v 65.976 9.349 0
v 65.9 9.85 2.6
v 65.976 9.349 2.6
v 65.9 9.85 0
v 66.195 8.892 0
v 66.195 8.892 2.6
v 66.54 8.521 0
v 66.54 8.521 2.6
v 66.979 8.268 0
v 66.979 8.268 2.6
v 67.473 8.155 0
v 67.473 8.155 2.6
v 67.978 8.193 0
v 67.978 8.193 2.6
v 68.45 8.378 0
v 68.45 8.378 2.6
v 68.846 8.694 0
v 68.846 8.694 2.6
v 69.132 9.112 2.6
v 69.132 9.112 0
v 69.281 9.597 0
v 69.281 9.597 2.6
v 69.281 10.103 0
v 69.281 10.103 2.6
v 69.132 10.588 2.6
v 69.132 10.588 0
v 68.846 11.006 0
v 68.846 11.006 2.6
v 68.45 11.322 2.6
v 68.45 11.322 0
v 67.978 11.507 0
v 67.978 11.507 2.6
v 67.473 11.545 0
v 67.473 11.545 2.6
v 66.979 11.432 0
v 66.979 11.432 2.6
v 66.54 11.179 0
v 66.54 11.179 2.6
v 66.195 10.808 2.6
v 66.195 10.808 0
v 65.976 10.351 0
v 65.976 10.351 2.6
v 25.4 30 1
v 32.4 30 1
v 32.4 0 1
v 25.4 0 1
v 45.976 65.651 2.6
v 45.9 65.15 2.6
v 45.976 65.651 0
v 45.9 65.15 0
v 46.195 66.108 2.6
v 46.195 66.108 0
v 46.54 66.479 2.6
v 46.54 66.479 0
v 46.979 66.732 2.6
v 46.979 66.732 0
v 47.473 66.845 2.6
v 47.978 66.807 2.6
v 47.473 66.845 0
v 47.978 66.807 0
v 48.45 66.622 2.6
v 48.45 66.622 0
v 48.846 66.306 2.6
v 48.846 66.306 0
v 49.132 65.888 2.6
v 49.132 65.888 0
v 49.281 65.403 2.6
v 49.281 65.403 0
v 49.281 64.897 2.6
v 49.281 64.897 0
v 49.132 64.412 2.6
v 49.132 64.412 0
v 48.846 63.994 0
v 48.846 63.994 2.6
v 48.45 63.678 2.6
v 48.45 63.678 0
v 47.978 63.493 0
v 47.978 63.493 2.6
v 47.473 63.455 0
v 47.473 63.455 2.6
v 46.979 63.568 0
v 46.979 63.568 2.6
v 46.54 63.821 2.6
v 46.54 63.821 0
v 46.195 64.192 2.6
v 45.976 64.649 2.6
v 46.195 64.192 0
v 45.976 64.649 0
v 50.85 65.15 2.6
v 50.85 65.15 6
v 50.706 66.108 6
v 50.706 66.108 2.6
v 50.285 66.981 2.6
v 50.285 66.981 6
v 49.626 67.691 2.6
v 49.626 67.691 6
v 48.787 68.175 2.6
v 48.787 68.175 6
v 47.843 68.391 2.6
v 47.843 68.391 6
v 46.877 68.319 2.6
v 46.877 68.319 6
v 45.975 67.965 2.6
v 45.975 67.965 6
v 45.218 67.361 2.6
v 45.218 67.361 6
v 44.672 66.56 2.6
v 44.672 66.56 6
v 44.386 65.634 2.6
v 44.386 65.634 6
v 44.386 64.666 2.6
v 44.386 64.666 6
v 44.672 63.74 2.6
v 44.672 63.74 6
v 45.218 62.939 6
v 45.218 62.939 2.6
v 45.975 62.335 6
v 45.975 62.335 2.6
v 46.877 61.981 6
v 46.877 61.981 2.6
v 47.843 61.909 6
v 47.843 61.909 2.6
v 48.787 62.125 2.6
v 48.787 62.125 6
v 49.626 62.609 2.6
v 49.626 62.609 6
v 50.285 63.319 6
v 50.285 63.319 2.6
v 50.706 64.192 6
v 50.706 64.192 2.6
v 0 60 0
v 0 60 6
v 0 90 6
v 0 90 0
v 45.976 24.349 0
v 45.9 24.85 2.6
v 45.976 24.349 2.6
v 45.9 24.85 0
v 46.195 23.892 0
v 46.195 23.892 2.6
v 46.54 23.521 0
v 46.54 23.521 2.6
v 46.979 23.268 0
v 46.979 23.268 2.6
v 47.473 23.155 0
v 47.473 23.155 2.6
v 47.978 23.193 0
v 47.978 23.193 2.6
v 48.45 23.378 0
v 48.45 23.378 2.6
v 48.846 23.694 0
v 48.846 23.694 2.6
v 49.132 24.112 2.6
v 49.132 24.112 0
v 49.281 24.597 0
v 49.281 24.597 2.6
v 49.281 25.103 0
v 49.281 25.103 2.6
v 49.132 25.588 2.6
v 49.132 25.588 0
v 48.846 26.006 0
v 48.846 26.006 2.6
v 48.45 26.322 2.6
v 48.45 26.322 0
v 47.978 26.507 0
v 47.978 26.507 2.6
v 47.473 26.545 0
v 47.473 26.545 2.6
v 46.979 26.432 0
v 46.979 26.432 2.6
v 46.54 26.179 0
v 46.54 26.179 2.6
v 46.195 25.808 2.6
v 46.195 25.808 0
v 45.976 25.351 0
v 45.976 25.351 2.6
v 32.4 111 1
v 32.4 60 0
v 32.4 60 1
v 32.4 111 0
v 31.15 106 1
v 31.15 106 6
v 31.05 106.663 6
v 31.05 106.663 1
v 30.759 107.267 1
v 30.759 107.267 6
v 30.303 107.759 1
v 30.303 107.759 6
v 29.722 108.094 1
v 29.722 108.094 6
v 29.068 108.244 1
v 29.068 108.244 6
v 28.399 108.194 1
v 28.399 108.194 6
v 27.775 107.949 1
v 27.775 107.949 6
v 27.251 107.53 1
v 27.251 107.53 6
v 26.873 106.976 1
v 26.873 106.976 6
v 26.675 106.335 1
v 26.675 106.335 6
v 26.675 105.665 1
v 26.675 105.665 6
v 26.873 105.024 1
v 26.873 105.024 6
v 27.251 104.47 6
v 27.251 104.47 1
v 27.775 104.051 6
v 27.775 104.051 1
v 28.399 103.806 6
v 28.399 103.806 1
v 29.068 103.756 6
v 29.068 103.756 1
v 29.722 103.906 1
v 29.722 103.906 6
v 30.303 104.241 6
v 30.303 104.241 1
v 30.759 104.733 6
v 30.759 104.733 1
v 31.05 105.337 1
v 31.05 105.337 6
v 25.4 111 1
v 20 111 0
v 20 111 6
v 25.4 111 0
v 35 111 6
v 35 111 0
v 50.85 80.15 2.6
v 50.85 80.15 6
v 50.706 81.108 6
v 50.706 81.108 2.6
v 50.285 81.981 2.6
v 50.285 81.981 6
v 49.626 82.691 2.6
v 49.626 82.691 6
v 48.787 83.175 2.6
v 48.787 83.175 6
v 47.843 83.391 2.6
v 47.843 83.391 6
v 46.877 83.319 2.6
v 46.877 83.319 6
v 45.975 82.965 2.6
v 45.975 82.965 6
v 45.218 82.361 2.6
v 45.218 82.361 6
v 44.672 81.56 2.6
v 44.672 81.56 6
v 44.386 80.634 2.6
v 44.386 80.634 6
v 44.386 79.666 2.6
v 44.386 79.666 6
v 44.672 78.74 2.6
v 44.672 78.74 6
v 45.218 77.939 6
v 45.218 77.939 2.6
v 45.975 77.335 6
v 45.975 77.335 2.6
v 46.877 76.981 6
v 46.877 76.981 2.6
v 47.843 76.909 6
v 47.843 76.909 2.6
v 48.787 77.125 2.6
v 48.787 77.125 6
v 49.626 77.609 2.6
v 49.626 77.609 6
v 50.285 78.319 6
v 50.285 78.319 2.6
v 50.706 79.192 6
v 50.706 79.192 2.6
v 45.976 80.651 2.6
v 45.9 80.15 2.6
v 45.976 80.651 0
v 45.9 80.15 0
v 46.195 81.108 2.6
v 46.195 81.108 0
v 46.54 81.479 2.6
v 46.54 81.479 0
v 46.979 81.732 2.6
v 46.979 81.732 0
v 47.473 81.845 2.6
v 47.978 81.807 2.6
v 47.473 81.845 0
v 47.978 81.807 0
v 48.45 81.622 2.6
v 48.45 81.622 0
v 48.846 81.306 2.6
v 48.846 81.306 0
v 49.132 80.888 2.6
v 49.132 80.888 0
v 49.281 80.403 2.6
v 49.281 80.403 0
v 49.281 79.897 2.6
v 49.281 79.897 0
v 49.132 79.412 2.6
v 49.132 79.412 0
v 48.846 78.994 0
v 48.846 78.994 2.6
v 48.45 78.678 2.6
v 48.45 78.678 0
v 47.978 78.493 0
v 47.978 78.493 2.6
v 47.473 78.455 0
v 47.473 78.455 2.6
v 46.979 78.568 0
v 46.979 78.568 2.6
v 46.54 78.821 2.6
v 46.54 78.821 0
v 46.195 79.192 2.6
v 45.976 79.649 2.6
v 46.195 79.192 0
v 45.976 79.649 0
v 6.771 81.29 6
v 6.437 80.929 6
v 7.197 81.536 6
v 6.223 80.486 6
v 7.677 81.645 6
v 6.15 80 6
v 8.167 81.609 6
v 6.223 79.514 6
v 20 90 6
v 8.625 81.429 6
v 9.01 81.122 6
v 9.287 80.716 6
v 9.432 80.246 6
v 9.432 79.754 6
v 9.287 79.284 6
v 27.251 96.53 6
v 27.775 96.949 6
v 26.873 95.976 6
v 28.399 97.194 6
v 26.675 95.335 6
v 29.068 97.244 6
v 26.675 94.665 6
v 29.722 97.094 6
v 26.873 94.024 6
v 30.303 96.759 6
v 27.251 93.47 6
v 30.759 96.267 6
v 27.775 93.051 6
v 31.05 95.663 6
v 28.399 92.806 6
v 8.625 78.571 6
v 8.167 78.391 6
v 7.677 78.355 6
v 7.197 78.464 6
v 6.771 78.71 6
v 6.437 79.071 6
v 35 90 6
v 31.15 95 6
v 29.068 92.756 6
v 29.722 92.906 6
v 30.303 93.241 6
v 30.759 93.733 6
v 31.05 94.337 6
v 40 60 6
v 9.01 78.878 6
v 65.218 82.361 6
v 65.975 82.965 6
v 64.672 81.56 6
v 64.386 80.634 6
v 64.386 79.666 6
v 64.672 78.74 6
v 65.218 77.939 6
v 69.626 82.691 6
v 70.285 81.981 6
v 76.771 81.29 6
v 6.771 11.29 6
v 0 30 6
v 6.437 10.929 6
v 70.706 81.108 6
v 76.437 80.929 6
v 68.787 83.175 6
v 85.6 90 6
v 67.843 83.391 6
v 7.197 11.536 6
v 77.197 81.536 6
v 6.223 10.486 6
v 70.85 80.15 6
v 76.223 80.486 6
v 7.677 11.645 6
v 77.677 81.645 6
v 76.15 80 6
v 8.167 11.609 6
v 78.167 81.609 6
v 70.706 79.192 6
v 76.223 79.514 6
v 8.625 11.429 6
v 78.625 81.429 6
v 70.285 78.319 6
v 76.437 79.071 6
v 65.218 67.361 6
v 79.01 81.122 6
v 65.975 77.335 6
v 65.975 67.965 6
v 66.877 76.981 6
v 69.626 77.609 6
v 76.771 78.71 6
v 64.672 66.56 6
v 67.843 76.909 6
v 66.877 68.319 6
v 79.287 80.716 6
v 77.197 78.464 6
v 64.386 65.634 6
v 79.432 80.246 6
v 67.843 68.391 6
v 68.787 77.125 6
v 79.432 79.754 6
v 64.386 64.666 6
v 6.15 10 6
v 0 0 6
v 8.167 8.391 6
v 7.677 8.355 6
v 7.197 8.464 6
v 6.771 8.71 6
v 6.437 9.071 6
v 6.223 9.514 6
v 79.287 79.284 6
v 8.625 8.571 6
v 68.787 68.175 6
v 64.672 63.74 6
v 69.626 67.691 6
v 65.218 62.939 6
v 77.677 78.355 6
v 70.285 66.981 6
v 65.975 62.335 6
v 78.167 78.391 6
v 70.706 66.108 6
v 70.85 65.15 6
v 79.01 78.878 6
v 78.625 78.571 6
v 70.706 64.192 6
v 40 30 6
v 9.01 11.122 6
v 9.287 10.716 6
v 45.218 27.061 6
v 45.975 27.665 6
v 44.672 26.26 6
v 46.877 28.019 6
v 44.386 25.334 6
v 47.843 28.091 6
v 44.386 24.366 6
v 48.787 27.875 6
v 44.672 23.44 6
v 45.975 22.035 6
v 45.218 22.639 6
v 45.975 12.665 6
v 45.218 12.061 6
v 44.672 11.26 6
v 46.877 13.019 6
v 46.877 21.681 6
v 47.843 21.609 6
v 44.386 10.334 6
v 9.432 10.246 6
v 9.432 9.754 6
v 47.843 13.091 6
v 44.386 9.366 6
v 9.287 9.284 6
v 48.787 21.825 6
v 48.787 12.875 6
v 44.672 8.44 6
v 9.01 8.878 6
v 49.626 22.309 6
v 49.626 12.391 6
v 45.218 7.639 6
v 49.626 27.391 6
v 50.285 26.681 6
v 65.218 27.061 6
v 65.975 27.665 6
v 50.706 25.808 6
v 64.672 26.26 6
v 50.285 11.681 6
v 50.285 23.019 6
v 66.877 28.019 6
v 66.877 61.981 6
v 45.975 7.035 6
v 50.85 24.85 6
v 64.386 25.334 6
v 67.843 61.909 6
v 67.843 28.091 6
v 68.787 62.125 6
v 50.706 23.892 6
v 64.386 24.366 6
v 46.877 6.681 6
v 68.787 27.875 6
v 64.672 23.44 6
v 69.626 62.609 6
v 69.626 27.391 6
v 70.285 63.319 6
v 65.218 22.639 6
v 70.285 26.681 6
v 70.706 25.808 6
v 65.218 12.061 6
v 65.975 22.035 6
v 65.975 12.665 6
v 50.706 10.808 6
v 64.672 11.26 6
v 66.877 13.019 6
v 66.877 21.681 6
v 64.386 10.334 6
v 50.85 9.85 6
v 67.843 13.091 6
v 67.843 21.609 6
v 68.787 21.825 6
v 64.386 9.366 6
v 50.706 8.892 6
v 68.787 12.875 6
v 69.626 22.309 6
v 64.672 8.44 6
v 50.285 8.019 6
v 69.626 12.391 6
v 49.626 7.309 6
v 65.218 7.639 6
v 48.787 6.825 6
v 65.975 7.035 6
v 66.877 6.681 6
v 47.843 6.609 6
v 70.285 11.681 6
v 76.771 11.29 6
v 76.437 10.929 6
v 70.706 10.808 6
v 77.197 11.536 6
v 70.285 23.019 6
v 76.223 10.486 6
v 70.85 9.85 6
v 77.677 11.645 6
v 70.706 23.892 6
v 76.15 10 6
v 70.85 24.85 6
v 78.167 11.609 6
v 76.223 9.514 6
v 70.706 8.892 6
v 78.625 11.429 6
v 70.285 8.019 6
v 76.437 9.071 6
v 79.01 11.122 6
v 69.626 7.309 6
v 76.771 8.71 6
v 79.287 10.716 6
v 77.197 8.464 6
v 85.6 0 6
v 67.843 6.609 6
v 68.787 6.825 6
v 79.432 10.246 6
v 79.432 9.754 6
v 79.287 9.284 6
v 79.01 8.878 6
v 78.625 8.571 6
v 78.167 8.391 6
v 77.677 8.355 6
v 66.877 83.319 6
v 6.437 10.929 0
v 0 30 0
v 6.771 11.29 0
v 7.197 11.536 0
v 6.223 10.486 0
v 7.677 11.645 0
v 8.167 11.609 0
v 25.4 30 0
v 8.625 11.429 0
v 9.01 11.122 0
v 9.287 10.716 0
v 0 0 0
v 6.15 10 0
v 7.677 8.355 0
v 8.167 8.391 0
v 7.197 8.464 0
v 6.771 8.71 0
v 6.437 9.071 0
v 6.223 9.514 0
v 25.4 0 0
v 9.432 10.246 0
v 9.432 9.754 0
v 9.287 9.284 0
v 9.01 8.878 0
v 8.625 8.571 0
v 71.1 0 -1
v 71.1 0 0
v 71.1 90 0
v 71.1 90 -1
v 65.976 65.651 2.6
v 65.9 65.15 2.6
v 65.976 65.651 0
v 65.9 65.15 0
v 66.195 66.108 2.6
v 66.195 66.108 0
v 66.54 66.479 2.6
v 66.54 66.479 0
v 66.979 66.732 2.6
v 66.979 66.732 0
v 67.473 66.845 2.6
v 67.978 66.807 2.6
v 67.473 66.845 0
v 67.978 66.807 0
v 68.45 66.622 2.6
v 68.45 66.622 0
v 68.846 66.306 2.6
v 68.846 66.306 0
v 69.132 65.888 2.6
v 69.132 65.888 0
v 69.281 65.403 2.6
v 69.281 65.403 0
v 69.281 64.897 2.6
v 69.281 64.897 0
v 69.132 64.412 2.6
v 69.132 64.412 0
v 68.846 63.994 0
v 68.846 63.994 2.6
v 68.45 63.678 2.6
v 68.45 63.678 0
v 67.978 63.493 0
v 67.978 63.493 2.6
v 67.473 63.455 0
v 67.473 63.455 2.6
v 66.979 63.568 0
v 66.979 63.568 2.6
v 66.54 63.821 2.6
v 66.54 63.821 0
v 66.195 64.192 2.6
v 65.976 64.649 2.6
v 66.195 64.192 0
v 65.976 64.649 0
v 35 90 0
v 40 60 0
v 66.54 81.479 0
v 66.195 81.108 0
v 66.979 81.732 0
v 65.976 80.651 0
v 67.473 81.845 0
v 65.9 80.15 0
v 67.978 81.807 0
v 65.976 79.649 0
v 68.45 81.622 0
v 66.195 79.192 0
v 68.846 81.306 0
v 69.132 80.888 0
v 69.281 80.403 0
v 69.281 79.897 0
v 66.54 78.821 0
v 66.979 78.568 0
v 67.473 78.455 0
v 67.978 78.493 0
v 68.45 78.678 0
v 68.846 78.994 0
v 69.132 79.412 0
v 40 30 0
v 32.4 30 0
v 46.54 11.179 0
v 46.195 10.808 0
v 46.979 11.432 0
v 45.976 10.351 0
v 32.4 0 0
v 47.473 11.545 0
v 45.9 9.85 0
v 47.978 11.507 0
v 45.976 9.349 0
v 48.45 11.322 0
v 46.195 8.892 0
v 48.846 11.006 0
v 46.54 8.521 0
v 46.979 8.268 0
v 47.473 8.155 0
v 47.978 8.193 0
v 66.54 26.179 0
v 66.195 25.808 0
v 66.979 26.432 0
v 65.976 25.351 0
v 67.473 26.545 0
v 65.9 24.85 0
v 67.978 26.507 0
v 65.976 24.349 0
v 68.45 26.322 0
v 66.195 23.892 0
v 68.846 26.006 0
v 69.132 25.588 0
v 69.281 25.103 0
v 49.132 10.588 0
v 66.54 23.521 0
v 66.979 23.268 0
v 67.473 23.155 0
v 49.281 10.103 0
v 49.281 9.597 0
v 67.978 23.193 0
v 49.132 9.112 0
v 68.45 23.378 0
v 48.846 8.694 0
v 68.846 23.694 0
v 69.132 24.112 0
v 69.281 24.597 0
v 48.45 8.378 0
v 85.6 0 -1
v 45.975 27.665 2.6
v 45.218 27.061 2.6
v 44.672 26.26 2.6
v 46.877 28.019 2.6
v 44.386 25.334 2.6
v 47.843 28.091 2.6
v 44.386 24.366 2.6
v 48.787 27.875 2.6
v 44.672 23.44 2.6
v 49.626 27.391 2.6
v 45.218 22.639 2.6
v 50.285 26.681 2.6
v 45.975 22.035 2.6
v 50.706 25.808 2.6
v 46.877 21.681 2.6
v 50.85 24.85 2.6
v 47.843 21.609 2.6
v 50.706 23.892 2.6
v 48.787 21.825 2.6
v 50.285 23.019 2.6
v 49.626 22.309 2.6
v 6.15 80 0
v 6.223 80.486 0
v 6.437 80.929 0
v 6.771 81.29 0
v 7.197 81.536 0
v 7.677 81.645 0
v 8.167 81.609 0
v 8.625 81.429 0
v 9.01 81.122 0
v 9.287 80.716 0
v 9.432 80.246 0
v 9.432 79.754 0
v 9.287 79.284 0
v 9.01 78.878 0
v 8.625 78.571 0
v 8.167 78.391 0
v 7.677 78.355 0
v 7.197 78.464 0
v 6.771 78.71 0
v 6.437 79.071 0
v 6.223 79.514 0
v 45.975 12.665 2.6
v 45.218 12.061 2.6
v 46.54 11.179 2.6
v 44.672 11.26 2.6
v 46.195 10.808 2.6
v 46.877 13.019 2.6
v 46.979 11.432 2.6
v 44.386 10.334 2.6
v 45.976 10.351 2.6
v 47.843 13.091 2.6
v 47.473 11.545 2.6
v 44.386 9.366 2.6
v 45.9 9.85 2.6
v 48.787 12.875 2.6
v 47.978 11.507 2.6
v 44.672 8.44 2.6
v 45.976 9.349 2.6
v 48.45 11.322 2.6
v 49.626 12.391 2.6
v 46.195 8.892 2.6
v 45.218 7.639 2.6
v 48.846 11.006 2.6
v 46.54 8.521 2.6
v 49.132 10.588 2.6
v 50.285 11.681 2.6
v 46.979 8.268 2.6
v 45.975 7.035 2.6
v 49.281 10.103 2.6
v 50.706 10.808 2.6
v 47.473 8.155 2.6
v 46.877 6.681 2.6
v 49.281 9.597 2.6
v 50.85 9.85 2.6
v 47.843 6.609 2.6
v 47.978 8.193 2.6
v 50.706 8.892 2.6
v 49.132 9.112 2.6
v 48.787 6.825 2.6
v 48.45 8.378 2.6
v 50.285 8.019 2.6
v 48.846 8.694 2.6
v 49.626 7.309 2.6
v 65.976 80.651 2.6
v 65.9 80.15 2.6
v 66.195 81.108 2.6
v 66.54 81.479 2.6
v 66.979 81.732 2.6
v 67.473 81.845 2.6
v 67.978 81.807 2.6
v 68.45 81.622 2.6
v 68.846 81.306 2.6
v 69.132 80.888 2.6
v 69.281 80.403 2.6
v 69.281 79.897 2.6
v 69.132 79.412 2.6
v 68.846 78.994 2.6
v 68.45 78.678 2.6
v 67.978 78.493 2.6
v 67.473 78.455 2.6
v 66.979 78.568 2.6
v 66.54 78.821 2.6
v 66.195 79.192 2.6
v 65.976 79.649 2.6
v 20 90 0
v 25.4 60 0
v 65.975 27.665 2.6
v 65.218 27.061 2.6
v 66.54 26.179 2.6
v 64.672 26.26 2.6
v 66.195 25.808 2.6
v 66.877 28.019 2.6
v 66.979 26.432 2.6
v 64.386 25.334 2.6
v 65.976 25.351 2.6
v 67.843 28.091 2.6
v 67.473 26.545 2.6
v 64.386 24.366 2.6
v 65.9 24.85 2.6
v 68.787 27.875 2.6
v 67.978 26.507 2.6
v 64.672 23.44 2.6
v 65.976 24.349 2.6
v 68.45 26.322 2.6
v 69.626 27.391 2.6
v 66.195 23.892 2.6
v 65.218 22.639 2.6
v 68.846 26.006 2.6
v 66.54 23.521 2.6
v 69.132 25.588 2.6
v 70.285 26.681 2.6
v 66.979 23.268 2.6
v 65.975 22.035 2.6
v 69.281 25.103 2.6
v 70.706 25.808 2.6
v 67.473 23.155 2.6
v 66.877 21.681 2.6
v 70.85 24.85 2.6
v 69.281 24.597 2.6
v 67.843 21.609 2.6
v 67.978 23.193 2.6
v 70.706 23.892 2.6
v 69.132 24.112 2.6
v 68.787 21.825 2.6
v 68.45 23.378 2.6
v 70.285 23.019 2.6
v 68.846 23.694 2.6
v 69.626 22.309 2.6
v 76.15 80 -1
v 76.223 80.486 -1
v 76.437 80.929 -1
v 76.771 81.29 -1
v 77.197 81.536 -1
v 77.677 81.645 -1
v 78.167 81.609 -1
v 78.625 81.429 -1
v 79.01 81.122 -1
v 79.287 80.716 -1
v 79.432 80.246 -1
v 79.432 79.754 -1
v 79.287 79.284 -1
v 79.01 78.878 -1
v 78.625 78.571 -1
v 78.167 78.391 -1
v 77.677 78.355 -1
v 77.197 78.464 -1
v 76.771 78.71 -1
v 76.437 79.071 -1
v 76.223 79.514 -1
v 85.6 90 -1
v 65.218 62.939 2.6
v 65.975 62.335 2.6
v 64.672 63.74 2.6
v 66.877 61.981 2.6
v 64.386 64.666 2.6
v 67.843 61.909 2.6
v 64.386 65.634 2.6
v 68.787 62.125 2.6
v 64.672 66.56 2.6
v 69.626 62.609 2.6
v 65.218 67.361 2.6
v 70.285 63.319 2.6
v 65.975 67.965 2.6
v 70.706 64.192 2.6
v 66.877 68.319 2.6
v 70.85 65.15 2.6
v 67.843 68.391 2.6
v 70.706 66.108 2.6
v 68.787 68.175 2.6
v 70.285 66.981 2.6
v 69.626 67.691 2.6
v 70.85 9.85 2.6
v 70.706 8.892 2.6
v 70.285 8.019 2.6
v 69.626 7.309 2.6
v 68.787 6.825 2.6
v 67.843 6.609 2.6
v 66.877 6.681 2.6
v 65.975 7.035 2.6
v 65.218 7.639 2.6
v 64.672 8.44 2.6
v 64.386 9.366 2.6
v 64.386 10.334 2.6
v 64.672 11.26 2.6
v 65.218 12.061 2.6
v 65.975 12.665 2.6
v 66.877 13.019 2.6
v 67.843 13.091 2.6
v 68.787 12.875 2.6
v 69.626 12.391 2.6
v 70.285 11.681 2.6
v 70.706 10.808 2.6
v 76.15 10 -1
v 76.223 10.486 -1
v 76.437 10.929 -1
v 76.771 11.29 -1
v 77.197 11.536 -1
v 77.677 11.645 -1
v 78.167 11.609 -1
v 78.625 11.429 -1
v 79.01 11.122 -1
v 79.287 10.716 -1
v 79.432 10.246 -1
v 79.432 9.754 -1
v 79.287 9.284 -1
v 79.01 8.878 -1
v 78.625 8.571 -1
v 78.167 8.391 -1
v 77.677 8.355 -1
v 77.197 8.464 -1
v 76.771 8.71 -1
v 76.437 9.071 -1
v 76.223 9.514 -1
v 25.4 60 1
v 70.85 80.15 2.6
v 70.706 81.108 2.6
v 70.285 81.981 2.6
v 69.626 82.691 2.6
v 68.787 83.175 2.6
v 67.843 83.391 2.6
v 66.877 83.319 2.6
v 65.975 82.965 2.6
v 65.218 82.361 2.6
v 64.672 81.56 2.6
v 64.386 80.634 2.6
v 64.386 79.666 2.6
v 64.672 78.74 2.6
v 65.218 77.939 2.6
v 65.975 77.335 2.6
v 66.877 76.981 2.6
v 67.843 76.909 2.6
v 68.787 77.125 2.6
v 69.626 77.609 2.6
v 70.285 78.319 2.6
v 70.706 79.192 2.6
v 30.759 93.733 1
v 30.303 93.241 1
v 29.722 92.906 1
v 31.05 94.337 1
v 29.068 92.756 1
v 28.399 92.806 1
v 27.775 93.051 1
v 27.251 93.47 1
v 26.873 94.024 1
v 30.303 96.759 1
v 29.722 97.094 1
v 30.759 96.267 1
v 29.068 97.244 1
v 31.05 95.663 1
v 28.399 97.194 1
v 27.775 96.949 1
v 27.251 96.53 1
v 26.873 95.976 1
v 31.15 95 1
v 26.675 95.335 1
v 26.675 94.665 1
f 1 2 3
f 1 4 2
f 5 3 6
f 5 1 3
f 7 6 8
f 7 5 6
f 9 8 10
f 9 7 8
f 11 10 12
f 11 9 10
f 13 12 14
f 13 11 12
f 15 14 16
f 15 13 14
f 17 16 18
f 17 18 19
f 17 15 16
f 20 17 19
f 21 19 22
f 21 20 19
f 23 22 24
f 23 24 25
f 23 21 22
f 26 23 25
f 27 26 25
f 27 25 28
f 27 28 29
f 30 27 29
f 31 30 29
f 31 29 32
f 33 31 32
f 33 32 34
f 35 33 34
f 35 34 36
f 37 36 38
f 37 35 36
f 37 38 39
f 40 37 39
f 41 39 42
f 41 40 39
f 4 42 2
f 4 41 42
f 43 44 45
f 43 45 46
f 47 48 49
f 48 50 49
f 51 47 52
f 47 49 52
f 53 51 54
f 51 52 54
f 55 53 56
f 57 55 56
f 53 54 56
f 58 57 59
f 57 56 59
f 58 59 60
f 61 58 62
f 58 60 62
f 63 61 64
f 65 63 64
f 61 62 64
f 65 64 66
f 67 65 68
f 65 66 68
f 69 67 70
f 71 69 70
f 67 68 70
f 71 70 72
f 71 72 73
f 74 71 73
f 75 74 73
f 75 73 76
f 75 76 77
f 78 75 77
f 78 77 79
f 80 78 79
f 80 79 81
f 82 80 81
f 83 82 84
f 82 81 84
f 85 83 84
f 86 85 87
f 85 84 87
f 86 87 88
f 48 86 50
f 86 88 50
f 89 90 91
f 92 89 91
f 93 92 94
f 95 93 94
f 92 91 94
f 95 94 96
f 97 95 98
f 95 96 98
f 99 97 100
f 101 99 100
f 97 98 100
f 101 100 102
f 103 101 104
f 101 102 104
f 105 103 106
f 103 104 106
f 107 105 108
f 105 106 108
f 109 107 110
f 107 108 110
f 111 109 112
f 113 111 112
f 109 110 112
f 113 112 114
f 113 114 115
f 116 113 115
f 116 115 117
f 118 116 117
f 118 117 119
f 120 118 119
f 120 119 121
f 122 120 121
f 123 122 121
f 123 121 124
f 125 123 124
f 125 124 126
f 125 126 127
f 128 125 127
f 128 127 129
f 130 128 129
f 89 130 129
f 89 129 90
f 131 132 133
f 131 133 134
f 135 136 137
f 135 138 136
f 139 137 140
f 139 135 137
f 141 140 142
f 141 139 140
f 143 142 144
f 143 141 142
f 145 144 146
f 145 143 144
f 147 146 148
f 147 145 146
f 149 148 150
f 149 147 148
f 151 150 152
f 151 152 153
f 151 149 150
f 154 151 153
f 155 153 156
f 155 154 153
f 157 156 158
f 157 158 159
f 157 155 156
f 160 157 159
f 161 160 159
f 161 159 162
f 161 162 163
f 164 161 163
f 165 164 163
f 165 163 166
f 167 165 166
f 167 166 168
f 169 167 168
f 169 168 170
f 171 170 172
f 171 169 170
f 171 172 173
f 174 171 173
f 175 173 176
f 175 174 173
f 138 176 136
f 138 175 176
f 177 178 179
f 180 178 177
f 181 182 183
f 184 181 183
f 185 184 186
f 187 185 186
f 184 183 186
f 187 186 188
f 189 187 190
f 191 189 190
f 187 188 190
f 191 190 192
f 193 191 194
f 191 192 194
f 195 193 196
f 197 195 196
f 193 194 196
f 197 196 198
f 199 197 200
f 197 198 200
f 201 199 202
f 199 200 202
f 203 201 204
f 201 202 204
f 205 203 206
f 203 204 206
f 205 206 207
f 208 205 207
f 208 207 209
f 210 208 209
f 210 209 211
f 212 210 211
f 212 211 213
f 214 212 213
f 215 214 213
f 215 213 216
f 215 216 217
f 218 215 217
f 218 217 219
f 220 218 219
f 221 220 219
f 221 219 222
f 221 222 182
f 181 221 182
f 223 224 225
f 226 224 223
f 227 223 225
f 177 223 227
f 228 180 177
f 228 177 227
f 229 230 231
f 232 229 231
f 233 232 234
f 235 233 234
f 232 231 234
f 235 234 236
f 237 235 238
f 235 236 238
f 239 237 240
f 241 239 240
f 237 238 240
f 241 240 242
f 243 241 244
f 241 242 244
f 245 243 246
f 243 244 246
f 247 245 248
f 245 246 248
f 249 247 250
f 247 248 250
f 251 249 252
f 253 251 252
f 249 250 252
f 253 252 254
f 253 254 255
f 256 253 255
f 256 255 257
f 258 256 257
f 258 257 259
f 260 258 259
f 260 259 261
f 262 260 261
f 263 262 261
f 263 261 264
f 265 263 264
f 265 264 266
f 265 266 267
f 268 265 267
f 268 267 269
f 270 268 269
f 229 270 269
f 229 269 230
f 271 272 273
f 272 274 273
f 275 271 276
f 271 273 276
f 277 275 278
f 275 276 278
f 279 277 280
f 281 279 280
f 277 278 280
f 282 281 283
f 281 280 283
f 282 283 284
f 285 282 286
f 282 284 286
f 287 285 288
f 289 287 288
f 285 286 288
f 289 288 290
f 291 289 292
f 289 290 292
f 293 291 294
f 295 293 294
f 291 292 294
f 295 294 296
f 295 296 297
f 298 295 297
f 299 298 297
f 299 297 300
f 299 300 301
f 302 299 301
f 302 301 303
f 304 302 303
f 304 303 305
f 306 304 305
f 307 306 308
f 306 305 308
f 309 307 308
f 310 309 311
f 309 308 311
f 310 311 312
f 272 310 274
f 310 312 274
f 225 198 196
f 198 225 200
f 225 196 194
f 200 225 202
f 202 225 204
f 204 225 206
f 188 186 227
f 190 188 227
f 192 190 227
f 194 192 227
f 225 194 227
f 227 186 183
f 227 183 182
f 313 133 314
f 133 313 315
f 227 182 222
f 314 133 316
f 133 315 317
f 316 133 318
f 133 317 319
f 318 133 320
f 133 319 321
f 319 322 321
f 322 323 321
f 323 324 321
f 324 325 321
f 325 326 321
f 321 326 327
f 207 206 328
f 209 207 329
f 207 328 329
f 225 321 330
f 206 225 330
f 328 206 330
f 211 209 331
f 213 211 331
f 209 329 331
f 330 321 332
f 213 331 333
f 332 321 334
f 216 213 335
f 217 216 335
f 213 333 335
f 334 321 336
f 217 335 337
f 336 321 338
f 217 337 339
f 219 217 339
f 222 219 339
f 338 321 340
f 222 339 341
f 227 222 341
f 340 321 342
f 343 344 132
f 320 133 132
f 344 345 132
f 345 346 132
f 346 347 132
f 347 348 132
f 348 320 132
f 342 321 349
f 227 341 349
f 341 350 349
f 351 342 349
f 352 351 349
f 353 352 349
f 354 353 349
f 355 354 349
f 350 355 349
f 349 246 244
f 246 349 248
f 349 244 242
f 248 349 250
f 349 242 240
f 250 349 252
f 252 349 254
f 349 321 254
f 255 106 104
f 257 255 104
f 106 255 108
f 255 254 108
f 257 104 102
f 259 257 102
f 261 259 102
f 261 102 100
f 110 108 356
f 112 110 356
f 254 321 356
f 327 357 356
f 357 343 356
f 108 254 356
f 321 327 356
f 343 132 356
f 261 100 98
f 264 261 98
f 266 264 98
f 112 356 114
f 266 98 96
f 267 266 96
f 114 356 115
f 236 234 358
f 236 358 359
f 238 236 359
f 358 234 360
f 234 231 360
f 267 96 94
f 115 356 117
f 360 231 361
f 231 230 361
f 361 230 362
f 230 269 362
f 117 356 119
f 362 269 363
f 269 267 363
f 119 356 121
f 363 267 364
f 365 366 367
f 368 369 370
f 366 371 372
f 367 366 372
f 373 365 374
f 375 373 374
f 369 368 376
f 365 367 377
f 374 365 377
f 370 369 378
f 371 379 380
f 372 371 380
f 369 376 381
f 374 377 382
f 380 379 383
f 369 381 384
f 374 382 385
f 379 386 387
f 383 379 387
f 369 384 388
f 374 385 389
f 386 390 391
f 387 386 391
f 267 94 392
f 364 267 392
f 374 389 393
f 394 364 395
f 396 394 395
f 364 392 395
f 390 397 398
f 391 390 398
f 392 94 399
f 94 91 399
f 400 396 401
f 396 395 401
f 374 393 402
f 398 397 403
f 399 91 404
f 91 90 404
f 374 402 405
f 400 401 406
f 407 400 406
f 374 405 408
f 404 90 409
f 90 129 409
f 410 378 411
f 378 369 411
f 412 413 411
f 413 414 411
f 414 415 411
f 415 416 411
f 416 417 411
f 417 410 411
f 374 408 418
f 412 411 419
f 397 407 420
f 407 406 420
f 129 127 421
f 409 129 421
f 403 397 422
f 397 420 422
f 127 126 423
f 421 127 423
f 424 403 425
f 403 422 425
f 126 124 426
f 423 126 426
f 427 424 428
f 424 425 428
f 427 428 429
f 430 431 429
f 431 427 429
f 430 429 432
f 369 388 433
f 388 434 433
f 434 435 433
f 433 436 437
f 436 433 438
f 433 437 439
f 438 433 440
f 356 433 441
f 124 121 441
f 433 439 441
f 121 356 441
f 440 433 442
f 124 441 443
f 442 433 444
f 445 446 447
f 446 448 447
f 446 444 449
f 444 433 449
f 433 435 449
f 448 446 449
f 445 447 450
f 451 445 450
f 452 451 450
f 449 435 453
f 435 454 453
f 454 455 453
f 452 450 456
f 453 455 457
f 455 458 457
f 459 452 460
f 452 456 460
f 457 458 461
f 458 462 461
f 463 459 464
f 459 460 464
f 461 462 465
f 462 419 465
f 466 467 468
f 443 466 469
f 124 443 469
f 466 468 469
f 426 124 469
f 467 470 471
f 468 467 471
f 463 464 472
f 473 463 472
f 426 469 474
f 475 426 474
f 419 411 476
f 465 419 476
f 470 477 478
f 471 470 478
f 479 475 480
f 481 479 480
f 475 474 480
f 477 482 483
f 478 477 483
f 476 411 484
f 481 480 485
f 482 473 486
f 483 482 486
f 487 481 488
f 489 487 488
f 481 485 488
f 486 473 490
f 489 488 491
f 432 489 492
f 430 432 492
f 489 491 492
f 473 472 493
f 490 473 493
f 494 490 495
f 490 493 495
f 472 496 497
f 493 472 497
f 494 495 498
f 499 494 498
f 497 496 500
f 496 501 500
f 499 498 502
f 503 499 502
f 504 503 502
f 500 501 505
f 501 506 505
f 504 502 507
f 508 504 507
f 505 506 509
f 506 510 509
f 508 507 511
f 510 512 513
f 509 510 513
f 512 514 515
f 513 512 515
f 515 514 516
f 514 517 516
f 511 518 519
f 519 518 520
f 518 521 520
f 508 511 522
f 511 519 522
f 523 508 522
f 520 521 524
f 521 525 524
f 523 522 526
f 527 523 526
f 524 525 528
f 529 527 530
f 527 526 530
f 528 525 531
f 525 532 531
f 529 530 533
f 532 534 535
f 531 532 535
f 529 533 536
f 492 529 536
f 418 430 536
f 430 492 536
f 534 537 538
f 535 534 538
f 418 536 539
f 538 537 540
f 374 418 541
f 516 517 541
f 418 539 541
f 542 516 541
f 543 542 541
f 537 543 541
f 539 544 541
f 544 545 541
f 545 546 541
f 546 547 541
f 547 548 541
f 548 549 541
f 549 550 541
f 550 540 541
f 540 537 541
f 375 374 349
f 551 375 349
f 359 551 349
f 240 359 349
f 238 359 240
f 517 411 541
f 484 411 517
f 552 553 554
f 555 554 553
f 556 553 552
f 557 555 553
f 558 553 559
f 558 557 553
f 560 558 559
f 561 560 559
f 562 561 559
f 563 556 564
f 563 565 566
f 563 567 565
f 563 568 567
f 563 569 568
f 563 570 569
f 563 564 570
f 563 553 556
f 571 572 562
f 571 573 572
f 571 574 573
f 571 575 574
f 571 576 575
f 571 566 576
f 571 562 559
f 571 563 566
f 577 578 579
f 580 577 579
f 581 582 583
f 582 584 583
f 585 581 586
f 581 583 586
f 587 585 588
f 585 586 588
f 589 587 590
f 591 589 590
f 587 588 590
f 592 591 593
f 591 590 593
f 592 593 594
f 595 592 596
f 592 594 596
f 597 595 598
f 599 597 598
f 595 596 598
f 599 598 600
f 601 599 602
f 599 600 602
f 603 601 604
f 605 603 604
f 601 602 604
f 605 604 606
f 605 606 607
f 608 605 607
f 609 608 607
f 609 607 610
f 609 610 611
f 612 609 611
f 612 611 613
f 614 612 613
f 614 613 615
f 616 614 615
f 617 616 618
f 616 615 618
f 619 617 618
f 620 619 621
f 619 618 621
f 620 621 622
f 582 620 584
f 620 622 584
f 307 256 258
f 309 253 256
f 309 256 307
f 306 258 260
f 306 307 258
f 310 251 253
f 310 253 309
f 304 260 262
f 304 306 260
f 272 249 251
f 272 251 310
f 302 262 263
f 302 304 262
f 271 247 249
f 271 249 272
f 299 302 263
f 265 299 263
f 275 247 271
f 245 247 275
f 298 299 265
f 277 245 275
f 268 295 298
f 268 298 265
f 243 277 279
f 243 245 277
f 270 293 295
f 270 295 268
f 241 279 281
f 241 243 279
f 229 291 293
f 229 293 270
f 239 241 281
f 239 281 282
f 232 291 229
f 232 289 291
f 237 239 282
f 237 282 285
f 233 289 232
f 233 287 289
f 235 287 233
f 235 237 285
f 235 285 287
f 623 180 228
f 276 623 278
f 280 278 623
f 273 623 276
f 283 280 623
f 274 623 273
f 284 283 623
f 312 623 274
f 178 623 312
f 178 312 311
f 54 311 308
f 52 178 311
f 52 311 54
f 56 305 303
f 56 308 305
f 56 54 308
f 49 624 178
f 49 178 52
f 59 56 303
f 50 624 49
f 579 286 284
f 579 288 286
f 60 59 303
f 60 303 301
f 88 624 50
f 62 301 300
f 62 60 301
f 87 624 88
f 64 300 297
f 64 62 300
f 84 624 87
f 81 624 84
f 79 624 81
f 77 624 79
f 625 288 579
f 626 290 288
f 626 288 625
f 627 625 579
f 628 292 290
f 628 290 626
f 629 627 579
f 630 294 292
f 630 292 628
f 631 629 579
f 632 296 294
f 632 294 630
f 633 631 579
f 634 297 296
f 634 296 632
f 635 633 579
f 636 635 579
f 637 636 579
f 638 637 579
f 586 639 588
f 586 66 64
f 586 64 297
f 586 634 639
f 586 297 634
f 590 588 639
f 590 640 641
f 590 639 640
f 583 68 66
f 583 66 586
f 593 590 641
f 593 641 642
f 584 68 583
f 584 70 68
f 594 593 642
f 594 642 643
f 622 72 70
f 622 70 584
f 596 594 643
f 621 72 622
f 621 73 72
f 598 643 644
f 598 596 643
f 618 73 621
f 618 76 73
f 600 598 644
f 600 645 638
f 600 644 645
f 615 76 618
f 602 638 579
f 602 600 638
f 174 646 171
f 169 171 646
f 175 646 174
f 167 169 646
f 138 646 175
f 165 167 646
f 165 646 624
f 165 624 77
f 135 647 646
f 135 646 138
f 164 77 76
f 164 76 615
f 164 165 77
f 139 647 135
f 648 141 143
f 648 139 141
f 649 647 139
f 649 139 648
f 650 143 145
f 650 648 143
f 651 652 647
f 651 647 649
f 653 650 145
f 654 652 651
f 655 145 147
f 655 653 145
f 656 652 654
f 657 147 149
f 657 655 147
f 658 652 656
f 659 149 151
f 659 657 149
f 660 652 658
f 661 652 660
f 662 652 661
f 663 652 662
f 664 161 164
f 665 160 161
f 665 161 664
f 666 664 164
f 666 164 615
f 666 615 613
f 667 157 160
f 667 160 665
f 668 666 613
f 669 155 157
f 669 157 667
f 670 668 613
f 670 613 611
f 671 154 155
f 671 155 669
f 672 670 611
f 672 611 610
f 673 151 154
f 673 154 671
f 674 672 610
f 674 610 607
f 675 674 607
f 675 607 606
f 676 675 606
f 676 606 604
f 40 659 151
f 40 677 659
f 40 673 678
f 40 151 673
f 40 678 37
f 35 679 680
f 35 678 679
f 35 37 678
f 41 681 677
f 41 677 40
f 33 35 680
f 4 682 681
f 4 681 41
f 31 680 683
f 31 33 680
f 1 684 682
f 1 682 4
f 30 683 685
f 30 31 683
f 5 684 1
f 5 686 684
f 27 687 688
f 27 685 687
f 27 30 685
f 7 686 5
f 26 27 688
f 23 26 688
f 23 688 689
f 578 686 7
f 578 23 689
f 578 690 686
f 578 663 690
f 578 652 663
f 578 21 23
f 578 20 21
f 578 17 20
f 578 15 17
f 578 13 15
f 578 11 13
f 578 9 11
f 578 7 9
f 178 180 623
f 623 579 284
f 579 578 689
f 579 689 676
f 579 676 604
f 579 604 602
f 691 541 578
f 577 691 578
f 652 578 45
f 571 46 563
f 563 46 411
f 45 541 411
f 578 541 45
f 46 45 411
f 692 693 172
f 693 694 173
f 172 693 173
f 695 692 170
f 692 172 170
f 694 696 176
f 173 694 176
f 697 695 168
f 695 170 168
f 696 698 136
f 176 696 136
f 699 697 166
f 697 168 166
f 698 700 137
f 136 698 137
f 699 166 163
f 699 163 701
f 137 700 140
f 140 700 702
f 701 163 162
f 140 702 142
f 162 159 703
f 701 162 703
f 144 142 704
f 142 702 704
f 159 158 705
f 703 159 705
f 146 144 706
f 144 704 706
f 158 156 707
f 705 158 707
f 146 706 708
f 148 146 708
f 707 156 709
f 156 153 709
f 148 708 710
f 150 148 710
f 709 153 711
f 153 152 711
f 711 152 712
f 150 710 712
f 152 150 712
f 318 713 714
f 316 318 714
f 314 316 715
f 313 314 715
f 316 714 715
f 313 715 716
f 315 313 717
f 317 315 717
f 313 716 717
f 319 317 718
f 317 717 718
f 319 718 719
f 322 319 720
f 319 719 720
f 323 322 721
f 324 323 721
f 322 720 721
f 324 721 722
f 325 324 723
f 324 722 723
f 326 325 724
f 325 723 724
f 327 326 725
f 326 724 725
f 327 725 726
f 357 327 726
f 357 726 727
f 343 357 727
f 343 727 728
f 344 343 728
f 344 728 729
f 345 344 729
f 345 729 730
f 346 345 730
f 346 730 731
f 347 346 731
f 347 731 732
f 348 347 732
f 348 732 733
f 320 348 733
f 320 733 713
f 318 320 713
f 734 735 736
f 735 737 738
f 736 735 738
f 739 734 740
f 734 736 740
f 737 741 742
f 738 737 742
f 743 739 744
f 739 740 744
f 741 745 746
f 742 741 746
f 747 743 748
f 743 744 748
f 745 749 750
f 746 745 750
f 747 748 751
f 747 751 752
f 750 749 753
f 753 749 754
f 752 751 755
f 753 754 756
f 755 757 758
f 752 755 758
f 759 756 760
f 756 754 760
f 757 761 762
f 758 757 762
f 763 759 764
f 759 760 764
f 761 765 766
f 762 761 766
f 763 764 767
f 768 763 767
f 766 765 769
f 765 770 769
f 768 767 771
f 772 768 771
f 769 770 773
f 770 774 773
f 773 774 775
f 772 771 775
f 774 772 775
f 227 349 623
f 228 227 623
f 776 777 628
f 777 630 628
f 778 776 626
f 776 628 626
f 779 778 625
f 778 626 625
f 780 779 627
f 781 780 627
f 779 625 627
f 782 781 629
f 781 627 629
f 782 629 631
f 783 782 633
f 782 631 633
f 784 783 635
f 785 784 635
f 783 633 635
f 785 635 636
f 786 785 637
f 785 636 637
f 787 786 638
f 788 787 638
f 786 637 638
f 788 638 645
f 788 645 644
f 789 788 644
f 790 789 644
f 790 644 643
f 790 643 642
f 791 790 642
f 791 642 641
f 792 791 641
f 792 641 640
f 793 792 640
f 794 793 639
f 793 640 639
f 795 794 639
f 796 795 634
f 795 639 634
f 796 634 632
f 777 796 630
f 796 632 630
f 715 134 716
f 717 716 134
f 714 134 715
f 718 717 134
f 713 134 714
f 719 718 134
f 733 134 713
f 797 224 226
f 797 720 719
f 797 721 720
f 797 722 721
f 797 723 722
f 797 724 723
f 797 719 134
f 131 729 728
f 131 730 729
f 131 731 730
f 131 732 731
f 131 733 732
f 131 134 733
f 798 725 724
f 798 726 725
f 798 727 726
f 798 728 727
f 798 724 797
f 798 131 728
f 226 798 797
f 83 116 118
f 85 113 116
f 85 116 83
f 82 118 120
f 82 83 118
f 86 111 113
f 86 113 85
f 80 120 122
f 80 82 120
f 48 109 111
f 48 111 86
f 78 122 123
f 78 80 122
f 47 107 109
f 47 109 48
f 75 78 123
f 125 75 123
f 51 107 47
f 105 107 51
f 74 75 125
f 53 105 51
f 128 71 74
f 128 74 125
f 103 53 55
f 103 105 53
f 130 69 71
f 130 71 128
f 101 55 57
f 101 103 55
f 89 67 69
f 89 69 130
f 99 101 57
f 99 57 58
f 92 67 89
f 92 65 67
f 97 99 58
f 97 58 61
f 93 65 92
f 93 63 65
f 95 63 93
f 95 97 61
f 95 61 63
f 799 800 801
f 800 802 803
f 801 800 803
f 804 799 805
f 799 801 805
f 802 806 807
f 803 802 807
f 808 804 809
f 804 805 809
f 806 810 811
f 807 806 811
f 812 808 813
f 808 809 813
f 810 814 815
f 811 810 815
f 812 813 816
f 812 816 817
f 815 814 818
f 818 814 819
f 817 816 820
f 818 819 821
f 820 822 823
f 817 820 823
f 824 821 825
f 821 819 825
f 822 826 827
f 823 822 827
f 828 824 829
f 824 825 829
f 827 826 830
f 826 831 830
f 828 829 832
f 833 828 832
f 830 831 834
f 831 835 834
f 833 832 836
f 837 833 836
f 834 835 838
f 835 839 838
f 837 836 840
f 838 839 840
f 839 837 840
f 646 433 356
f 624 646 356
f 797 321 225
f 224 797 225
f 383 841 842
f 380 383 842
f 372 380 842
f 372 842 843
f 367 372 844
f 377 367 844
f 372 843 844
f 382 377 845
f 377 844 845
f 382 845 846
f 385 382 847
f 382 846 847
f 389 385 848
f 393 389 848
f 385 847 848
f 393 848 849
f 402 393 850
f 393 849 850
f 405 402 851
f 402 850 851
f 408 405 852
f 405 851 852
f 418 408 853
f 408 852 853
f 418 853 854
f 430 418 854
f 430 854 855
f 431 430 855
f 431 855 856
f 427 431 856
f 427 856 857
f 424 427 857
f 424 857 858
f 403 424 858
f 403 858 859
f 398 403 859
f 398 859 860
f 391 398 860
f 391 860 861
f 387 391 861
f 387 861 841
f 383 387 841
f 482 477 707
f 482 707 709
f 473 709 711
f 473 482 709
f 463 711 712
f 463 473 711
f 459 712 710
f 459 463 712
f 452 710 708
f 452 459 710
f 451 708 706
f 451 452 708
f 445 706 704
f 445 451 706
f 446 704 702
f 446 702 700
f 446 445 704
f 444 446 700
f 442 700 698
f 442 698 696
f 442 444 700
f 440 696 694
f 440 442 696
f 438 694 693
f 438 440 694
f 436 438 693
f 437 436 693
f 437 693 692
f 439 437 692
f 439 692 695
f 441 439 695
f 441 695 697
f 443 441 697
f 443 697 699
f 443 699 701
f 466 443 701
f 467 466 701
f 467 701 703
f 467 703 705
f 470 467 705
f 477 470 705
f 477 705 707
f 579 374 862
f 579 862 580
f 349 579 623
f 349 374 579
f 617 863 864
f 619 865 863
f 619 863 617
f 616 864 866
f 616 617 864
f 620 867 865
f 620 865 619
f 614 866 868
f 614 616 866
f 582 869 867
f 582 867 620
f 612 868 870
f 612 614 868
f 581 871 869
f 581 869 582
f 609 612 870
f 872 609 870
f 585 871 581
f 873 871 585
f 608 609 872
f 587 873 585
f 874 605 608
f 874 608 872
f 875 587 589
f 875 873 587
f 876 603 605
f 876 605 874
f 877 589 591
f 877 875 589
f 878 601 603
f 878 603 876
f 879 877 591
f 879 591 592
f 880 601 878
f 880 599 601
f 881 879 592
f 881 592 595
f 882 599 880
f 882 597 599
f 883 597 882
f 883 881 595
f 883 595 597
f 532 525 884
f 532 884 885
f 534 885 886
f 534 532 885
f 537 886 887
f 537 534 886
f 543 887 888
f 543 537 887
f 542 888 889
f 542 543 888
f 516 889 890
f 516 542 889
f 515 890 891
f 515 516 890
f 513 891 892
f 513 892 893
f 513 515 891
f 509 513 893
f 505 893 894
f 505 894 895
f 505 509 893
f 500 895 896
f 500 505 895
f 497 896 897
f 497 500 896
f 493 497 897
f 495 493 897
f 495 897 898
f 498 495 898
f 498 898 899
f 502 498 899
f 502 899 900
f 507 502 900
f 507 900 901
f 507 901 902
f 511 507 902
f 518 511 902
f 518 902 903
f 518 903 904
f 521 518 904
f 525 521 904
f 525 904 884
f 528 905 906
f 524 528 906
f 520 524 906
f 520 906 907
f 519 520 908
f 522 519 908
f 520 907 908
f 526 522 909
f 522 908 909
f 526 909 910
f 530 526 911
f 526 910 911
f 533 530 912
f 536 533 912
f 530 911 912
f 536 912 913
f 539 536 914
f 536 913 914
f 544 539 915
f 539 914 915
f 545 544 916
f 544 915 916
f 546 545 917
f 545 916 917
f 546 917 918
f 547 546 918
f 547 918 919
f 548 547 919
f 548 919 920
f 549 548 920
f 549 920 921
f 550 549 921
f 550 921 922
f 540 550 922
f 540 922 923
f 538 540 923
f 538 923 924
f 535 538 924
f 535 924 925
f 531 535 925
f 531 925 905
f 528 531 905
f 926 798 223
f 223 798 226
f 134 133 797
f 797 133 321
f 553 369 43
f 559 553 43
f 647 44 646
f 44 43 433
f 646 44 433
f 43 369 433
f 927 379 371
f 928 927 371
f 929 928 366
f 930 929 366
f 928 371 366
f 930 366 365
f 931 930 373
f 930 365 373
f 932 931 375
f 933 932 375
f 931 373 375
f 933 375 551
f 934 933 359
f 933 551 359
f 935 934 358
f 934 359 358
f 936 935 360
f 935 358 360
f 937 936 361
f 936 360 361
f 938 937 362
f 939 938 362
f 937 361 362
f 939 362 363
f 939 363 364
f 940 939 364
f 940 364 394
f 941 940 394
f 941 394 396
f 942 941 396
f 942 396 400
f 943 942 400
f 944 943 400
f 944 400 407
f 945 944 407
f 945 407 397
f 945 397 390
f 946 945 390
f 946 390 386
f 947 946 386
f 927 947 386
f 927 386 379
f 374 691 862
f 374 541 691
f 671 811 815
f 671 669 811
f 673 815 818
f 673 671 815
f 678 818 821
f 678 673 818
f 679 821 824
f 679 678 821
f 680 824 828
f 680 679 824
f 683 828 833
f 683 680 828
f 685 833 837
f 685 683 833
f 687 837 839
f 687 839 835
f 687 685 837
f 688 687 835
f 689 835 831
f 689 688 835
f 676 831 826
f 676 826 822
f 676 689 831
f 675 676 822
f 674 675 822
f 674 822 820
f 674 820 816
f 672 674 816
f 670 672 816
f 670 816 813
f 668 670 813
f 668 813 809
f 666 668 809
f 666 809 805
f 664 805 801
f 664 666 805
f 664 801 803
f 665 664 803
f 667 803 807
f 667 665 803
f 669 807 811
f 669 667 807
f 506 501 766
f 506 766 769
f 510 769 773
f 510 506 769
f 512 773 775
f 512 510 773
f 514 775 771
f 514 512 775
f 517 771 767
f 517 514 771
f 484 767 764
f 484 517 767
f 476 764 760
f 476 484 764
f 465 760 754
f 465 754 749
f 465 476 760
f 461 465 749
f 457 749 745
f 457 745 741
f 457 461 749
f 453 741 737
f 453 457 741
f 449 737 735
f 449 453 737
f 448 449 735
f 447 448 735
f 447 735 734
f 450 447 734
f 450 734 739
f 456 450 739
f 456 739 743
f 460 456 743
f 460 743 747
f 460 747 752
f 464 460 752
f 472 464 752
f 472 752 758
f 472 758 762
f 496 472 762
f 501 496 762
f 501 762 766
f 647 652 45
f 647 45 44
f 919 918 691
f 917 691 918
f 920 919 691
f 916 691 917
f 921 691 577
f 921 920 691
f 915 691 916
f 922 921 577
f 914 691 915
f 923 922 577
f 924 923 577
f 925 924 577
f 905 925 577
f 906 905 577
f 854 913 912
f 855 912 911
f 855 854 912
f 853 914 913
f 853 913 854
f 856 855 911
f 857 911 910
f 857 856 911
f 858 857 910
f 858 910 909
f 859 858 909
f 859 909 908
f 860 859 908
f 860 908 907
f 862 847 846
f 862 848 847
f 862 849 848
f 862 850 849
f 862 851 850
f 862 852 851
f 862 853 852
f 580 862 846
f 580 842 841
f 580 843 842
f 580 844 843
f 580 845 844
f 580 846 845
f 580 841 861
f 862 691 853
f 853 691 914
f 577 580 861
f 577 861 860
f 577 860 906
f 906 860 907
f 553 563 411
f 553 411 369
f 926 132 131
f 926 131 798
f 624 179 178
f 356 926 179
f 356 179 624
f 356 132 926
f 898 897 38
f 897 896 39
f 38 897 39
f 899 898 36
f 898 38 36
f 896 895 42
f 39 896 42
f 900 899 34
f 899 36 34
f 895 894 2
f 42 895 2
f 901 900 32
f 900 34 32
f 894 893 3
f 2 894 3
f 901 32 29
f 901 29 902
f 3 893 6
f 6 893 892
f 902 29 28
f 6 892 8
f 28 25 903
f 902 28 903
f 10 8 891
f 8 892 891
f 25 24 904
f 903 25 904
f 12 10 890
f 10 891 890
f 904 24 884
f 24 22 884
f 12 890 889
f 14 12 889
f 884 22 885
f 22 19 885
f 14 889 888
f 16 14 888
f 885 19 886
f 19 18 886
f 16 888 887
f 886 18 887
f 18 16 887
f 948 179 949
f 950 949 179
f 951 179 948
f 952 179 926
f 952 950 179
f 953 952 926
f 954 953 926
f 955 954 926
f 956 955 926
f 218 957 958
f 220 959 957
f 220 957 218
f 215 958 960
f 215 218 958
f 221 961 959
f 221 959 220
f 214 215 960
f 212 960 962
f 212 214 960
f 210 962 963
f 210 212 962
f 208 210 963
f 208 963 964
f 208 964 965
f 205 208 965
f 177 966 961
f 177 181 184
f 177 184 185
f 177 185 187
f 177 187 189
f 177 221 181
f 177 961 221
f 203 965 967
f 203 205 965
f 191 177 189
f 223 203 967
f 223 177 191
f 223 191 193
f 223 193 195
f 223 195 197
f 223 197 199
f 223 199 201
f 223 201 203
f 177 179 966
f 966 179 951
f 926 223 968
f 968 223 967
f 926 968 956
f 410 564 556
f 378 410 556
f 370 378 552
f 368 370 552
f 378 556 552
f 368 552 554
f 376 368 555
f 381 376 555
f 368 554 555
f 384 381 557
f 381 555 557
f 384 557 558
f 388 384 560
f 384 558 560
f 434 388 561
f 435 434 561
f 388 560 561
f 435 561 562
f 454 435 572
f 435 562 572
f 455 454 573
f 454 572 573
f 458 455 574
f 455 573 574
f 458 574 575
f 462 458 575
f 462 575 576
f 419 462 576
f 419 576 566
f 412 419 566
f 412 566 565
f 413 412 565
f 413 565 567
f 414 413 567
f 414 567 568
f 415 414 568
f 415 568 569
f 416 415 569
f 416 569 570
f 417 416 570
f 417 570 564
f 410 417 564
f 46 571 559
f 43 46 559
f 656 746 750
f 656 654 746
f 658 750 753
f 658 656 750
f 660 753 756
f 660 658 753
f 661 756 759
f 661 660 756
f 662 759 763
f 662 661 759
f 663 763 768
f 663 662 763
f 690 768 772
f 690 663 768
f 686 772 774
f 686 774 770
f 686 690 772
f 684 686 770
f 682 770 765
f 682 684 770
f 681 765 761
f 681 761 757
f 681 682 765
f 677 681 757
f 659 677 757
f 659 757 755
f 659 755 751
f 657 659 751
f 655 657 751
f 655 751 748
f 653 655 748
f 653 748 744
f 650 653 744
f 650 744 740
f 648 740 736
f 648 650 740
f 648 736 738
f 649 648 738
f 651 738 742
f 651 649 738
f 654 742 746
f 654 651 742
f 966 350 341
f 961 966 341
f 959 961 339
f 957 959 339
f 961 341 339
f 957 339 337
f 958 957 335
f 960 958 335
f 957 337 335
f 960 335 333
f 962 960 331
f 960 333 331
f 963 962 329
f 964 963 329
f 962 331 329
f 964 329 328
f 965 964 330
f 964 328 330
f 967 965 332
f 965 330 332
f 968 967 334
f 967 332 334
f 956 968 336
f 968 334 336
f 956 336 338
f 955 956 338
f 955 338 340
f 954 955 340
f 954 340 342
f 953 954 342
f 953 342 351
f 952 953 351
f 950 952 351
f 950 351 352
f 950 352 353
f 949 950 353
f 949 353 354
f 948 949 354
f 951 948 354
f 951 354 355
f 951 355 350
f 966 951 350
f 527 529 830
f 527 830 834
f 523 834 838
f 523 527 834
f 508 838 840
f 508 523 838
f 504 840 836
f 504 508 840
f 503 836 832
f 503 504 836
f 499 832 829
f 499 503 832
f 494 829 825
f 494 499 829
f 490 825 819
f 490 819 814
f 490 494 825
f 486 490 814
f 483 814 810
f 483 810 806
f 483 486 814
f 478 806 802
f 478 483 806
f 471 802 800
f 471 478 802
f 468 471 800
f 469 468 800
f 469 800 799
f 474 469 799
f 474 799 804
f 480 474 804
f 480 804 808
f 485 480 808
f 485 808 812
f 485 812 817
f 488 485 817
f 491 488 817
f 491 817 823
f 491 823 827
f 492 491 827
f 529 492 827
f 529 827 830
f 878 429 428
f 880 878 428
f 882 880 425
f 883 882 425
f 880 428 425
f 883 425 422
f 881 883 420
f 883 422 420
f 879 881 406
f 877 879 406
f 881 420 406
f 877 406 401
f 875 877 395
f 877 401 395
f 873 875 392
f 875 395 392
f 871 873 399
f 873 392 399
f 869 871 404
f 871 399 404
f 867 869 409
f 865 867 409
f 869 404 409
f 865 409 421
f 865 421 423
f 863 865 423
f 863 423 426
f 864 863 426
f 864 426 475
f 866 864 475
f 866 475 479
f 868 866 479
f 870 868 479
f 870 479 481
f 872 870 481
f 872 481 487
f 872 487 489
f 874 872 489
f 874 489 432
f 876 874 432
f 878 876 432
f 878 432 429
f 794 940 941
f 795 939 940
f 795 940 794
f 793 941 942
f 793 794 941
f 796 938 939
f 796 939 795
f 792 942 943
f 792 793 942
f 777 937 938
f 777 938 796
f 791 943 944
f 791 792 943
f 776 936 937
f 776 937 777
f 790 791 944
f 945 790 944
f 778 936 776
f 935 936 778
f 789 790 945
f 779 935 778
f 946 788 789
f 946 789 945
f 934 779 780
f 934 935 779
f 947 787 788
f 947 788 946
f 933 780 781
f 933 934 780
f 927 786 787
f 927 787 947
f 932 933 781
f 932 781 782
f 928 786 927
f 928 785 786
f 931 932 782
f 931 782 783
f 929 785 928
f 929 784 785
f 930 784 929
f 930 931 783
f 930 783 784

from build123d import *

# Parameters (mm, degrees)
SKETCH_1_W                   = 85.6
SKETCH_1_H                   = 90
EXTRUDE_1_DEPTH              = 6
SKETCH_2_W                   = 40
SKETCH_2_H                   = 30
CUT_EXTRUDE_1_DEPTH          = 7
SKETCH_3_W                   = 14.5
SKETCH_3_H                   = 90
EXTRUDE_2_DEPTH              = 1
HOLE_WIZARD_M3_1_D           = 3.4
HOLE_WIZARD_M3_1_CBORE_D     = 6.5
HOLE_WIZARD_M3_1_CBORE_DEPTH = 3.4
HOLE_WIZARD_M4_1_D           = 3.3
SKETCH_11_W                  = 35
SKETCH_11_H                  = 6
EXTRUDE_3_DEPTH              = 21
SKETCH_12_W                  = 20
SKETCH_12_H                  = 21
CUT_EXTRUDE_3_DEPTH          = 21
SKETCH_14_W                  = 7
SKETCH_14_H                  = 116.324427337
CUT_EXTRUDE_4_DEPTH          = 1
SKETCH_17_R                  = 2.25
CUT_EXTRUDE_5_DEPTH          = 8


with BuildPart() as part:
    # 草图1 → 凸台-拉伸1 (new body)
    with BuildSketch(Plane.XY):
        with Locations((42.8, 45)):
            Rectangle(SKETCH_1_W, SKETCH_1_H)
    extrude(amount=EXTRUDE_1_DEPTH)

    # 草图2 → 切除-拉伸1 (cut, through all)
    with BuildSketch(Plane.XY.offset(6)):
        with Locations((20, 45)):
            Rectangle(SKETCH_2_W, SKETCH_2_H)
    extrude(amount=-CUT_EXTRUDE_1_DEPTH, mode=Mode.SUBTRACT)

    # 草图3 → 凸台-拉伸2 (add)
    with BuildSketch(Plane(origin=(0, 0, 0), x_dir=(-1, 0, 0), z_dir=(0, 0, -1))):
        with Locations((-78.35, 45)):
            Rectangle(SKETCH_3_W, SKETCH_3_H)
    extrude(amount=EXTRUDE_2_DEPTH)

    # M3 六角凹头螺钉的柱形沉头孔1 (through all)
    with Locations(Plane.XY.offset(6)):
        with Locations((67.6, 65.15), (47.6, 65.15), (67.6, 80.15), (47.6, 80.15)):
            hole_wizard_m3_1 = CounterBoreHole(HOLE_WIZARD_M3_1_D / 2, HOLE_WIZARD_M3_1_CBORE_D / 2, HOLE_WIZARD_M3_1_CBORE_DEPTH)

    # 镜向1: M3 六角凹头螺钉的柱形沉头孔1 across plane
    add(hole_wizard_m3_1.mirror(Plane.ZX.offset(45)), mode=Mode.SUBTRACT)

    # M4 螺纹孔1 (through all)
    with Locations(Plane.XY.offset(6)):
        with Locations((77.8, 10), (7.8, 10), (77.8, 80), (7.8, 80)):
            Hole(HOLE_WIZARD_M4_1_D / 2)

    # 草图11 → 凸台-拉伸3 (add)
    with BuildSketch(Plane(origin=(0, 90, 0), x_dir=(1, 0, 0), z_dir=(0, 1, 0))):
        with Locations((17.5, -3)):
            Rectangle(SKETCH_11_W, SKETCH_11_H)
    extrude(amount=EXTRUDE_3_DEPTH)

    # 草图12 → 切除-拉伸3 (cut)
    with BuildSketch(Plane.XY.offset(6)):
        with Locations((10, 100.5)):
            Rectangle(SKETCH_12_W, SKETCH_12_H)
    extrude(amount=-CUT_EXTRUDE_3_DEPTH, mode=Mode.SUBTRACT)

    # 草图14 → 切除-拉伸4 (cut)
    with BuildSketch(Plane(origin=(0, 0, 0), x_dir=(-1, 0, 0), z_dir=(0, 0, -1))):
        with Locations((-28.9, 52.837786331)):
            Rectangle(SKETCH_14_W, SKETCH_14_H)
    extrude(amount=-CUT_EXTRUDE_4_DEPTH, mode=Mode.SUBTRACT)

    # 草图17 → 切除-拉伸5 (cut, through all)
    with BuildSketch(Plane.XY.offset(6)):
        with Locations((28.9, 106)):
            Circle(SKETCH_17_R)
        with Locations((28.9, 95)):
            Circle(SKETCH_17_R)
    extrude(amount=-CUT_EXTRUDE_5_DEPTH, mode=Mode.SUBTRACT)


solid = part.part
